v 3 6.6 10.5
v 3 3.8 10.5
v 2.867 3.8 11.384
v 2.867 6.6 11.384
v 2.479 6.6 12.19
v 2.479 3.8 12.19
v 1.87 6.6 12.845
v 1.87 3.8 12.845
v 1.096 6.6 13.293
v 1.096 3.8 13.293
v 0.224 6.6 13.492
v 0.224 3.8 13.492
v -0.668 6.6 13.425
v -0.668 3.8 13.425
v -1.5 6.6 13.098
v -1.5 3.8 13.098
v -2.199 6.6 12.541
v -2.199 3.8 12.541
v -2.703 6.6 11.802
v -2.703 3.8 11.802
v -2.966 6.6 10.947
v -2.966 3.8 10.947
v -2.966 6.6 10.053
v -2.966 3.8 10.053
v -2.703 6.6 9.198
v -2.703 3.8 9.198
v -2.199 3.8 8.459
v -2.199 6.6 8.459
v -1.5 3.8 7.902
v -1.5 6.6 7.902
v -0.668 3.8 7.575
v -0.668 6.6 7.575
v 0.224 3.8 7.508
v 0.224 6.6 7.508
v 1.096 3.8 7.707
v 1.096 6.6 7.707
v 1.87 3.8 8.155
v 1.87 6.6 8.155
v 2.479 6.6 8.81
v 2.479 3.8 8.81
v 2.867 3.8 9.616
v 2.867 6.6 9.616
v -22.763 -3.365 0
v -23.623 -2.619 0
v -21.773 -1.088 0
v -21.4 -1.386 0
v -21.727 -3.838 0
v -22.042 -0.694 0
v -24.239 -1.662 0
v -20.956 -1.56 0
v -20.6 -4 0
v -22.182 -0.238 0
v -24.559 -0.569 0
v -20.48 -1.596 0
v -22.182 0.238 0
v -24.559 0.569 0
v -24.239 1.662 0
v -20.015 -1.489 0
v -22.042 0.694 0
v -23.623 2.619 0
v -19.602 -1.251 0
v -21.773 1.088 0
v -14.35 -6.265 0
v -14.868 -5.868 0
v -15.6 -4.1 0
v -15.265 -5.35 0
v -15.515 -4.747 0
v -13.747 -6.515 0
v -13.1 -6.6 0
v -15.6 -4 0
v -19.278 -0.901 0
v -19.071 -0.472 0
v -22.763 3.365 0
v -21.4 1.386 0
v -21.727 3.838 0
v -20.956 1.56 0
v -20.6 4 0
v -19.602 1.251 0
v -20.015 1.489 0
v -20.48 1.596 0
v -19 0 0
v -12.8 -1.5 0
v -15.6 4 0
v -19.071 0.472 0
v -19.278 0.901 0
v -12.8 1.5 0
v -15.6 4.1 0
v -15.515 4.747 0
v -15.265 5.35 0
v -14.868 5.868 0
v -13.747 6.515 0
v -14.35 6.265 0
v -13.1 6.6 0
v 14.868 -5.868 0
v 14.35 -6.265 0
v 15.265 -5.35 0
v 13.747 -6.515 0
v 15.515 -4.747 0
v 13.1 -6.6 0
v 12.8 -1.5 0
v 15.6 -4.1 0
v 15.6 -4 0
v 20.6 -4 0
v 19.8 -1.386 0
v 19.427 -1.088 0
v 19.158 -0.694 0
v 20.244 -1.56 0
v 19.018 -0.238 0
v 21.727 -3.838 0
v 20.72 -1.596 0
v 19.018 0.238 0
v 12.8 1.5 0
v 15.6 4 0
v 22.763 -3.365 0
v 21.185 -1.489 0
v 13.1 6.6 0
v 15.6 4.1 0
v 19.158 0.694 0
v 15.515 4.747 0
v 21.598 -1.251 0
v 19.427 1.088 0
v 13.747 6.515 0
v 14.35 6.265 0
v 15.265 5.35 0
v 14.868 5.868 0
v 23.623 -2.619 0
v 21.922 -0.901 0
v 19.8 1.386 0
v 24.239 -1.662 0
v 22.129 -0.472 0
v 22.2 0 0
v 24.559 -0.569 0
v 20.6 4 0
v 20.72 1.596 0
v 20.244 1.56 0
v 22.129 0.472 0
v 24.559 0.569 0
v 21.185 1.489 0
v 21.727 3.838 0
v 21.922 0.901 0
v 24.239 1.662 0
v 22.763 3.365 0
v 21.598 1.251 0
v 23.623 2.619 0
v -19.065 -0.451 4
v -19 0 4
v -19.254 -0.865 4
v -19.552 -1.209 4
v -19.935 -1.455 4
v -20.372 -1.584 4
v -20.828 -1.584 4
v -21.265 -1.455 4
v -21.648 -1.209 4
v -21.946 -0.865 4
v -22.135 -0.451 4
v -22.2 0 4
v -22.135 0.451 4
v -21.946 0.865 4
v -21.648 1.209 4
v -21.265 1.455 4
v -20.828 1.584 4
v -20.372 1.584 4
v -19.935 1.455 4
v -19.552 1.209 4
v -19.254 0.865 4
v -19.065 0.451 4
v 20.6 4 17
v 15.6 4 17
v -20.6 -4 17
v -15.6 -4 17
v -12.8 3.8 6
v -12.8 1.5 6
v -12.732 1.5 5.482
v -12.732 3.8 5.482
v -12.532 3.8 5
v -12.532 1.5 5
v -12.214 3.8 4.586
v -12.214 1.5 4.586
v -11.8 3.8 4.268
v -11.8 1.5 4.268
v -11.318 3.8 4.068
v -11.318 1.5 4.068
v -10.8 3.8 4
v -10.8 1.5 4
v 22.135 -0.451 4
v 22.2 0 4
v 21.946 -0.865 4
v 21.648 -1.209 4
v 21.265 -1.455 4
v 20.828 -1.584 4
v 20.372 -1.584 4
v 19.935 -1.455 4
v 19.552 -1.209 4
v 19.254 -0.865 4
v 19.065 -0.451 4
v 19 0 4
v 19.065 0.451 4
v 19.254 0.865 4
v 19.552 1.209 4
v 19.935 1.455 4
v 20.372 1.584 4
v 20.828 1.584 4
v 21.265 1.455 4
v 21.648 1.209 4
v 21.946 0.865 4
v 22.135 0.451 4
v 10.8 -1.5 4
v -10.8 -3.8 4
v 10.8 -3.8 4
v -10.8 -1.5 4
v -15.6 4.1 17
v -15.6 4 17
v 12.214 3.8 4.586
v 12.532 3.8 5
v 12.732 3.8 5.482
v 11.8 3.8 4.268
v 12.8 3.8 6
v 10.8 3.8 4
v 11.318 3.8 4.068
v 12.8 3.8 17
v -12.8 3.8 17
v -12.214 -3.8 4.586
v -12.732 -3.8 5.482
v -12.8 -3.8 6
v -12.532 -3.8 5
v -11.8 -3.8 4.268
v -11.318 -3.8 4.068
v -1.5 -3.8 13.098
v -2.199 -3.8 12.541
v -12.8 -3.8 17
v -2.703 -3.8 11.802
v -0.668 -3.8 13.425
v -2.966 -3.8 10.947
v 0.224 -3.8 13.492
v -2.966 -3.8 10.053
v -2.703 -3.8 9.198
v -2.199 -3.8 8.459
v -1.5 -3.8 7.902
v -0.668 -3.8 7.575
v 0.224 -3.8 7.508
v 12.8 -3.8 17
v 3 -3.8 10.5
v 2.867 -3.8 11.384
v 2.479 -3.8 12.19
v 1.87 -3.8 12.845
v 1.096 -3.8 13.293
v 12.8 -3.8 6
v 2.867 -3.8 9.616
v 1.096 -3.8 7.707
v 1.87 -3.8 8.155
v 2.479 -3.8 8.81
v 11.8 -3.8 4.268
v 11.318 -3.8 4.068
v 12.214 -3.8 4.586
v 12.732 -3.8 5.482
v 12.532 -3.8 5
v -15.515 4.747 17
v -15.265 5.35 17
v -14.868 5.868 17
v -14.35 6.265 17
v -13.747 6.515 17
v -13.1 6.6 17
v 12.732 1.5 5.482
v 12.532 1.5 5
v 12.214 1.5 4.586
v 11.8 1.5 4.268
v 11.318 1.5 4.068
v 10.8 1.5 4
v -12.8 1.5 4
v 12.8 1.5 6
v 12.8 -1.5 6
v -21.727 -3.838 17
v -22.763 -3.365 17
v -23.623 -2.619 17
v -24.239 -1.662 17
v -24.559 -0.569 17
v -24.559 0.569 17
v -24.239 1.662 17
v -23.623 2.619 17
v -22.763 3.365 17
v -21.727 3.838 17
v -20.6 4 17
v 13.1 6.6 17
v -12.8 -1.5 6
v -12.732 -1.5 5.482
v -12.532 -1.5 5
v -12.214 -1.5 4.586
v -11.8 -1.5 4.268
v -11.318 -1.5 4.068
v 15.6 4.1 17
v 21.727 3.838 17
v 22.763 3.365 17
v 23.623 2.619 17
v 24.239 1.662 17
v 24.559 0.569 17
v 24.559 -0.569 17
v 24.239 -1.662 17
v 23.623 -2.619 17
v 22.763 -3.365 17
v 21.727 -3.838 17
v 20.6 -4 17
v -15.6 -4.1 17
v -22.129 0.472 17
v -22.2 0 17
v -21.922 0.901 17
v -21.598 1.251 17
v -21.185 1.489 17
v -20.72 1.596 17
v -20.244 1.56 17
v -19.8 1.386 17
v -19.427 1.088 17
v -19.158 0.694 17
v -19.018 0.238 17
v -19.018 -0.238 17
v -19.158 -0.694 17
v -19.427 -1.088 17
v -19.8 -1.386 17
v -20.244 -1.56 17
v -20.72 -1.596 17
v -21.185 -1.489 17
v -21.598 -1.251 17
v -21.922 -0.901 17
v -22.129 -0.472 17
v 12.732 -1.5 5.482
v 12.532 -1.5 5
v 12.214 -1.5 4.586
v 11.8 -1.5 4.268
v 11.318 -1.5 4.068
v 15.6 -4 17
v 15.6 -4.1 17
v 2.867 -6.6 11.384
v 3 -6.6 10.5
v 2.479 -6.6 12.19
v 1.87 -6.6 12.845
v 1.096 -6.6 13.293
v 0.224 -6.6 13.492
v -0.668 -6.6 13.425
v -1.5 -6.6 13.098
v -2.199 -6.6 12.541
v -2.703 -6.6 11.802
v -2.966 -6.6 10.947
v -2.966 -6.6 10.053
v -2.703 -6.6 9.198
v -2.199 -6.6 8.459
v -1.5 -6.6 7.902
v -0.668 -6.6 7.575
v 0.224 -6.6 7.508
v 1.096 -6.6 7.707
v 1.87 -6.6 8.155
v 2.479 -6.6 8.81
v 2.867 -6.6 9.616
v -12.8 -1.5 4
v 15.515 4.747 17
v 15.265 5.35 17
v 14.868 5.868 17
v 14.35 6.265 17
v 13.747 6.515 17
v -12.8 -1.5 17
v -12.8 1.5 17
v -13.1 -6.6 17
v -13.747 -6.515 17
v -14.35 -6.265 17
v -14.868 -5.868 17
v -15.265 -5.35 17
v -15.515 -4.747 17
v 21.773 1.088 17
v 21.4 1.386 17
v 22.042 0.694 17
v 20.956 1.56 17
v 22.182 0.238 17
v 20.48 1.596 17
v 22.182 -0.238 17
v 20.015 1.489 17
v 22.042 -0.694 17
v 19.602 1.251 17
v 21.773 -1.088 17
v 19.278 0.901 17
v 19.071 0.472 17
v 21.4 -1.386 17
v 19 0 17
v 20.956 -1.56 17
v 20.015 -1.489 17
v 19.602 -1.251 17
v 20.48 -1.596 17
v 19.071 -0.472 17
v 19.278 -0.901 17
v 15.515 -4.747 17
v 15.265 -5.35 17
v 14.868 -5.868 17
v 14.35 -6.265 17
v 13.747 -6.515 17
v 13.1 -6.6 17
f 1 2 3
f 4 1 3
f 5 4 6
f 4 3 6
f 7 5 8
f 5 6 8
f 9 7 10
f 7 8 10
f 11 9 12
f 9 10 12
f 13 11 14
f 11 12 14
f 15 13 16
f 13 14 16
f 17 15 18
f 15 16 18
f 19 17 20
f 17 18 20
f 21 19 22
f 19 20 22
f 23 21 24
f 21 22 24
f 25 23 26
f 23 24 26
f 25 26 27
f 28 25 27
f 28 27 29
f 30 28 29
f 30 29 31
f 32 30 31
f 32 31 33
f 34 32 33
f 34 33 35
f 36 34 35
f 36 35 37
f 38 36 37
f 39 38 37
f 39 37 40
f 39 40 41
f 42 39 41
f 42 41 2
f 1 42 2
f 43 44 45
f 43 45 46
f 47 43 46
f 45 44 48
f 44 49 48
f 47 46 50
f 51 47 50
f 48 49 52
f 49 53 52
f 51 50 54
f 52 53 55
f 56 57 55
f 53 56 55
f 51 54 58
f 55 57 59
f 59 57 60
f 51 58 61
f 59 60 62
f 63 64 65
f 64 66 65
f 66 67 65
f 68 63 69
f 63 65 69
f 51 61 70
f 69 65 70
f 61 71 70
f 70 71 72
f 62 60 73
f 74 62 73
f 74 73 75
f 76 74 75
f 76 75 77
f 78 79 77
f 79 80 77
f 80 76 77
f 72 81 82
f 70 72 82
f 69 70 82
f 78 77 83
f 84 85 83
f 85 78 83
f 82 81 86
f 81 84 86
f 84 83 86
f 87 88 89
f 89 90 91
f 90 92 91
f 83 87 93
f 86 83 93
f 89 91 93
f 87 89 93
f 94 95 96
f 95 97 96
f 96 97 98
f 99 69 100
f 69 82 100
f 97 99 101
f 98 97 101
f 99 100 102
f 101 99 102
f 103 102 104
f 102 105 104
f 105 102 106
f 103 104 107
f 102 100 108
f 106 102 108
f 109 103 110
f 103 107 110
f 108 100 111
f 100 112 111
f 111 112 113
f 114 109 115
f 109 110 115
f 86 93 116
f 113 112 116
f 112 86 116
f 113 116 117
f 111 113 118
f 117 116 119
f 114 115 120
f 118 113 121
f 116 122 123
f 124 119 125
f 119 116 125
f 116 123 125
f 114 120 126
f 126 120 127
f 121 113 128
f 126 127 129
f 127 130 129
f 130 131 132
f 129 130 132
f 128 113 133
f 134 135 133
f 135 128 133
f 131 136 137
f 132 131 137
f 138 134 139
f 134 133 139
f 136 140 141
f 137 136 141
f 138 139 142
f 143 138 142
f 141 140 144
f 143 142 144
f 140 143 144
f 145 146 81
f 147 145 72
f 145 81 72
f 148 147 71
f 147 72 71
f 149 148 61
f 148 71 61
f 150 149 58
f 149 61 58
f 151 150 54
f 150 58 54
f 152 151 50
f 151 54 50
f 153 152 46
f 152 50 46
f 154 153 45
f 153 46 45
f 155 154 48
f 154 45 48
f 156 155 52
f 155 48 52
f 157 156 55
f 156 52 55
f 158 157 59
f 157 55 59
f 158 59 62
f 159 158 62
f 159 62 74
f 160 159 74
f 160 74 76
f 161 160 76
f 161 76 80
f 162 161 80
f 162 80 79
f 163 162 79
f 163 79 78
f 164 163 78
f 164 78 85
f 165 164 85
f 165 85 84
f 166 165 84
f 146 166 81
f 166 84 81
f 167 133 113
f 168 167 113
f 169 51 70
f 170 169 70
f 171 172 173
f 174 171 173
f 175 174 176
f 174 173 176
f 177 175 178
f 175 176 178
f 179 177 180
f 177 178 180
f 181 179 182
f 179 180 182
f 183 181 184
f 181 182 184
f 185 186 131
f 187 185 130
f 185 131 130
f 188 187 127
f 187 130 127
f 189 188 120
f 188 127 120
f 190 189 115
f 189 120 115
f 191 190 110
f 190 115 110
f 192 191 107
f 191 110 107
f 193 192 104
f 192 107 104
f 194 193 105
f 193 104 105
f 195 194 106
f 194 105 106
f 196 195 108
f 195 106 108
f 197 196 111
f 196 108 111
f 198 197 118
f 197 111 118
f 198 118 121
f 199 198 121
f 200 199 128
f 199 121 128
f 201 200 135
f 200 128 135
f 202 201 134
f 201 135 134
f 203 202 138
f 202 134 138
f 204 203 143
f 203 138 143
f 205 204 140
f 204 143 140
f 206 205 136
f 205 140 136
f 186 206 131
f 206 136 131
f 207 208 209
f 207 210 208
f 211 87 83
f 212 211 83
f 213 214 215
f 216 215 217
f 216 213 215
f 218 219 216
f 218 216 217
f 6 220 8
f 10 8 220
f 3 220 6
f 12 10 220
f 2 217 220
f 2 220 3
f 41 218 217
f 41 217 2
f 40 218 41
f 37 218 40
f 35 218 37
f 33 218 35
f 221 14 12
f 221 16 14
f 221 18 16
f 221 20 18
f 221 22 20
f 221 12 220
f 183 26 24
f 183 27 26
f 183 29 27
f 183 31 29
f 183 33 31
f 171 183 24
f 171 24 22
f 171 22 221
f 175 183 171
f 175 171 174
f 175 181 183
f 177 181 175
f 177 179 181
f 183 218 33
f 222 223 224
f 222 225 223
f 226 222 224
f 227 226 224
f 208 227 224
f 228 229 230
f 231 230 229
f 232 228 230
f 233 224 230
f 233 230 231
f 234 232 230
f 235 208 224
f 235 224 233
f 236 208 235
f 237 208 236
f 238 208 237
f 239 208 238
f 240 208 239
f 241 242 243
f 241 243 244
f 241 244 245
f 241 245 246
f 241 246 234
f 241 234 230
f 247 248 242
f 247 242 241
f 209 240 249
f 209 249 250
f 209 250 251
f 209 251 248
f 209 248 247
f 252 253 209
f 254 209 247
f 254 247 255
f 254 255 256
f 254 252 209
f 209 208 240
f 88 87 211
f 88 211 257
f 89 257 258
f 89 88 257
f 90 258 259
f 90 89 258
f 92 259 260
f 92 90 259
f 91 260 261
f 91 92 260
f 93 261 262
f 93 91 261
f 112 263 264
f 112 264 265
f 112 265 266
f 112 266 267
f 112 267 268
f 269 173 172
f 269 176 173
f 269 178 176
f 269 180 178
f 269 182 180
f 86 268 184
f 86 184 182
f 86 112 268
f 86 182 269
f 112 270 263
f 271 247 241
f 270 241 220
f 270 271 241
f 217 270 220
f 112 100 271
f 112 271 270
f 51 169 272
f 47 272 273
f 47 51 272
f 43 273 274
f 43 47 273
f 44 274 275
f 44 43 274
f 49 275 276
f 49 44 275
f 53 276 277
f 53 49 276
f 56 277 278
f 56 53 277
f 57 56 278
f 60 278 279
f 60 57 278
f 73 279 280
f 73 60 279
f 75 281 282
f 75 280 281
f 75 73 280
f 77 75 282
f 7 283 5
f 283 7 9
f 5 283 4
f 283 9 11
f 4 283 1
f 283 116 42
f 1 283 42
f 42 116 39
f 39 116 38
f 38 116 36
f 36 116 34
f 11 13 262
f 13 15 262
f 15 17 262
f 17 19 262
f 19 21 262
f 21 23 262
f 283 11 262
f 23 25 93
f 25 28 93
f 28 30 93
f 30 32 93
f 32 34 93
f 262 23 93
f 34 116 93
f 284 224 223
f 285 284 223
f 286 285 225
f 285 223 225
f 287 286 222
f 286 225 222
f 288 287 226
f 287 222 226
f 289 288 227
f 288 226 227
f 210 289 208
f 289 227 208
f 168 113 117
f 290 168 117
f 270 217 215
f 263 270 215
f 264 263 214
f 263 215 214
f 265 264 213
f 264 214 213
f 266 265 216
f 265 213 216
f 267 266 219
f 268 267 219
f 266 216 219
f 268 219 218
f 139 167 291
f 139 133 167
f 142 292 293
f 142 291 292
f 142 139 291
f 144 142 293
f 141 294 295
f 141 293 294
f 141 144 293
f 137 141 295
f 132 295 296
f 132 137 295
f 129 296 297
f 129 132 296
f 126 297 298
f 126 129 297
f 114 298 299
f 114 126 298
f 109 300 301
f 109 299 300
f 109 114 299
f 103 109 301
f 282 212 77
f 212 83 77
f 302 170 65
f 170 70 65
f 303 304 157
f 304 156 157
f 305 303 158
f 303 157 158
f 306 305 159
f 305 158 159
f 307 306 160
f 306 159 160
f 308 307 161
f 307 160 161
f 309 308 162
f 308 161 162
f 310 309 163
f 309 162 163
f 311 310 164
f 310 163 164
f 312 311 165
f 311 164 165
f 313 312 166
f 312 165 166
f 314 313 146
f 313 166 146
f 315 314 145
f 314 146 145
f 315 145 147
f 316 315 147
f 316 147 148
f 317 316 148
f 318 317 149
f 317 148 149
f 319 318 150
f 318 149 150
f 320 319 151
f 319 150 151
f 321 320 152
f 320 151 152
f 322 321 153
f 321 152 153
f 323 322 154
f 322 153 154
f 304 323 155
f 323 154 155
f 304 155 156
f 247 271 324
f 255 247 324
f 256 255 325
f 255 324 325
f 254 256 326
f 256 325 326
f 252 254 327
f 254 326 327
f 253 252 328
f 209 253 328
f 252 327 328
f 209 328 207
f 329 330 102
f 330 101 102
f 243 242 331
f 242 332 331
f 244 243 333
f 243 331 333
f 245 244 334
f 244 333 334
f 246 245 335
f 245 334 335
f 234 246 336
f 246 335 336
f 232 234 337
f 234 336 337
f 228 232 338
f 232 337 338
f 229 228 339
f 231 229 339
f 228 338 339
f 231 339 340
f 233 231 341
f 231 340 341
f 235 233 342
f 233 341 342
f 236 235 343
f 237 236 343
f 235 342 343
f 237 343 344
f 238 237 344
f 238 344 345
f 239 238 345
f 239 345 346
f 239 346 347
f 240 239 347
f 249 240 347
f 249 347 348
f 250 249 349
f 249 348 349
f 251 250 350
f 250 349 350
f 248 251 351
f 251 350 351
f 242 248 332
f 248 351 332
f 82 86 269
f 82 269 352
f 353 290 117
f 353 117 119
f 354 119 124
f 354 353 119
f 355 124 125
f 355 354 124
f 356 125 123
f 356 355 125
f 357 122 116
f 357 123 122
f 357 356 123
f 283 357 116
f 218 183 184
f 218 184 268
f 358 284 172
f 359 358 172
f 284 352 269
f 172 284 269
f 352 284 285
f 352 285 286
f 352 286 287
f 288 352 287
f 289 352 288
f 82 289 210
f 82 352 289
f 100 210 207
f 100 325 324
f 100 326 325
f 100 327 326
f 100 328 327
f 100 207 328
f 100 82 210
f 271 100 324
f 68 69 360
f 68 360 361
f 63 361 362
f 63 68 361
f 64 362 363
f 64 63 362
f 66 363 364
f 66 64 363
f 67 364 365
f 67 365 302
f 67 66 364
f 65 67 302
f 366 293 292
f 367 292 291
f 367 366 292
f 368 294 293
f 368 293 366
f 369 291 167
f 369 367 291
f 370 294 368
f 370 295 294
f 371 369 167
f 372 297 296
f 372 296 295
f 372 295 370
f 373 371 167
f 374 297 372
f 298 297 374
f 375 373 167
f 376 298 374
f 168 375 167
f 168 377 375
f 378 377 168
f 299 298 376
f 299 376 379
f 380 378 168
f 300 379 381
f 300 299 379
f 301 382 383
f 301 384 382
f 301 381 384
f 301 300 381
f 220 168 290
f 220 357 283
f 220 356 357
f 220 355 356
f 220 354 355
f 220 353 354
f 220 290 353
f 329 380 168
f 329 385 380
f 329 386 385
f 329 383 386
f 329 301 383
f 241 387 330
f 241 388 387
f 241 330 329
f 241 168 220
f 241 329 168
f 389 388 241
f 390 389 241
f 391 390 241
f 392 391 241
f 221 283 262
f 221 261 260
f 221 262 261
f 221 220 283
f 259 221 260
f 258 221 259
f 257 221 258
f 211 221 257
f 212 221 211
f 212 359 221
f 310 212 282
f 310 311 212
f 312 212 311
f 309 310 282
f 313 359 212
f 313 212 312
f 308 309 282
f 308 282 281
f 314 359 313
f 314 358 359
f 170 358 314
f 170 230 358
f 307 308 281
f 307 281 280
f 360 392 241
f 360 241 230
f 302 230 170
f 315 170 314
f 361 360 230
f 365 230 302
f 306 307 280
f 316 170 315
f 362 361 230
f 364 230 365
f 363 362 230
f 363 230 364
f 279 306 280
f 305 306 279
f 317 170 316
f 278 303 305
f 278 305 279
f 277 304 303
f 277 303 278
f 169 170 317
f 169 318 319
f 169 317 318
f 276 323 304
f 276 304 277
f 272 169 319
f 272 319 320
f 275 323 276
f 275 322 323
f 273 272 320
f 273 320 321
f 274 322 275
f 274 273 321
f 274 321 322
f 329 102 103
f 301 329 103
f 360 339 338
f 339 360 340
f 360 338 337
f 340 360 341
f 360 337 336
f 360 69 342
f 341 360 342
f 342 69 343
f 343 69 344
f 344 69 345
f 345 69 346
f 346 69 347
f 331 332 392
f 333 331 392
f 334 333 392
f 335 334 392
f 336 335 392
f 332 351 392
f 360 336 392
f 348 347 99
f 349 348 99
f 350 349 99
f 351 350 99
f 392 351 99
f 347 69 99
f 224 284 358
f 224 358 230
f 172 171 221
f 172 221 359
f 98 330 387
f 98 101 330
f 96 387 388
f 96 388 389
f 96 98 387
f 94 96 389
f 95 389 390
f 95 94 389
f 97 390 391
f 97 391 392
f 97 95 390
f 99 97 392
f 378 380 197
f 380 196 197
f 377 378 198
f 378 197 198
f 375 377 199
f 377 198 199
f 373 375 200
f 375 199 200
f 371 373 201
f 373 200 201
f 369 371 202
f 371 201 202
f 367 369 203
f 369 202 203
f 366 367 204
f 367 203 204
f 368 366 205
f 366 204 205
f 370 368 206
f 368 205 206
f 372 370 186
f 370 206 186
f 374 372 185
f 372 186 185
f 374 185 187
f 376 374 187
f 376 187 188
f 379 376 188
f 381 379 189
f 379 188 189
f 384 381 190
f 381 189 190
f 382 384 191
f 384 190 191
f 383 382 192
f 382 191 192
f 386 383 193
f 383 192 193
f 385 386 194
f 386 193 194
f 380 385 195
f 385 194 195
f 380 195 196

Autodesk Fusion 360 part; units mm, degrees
sketch "Skizze1" plane through (0, 0, 0) normal (0, 0, 1) x (1, 0, 0)
  line L0 (12.8, 3.8) -> (-12.8, 3.8)
  line L1 (-12.8, 3.8) -> (-12.8, -3.8)
  line L2 (-12.8, -3.8) -> (12.8, -3.8)
  line L3 (12.8, -3.8) -> (12.8, 3.8)
  line L4 (12.8, 3.8) -> (-12.8, -3.8) construction
  line L5 (-12.8, 3.8) -> (12.8, -3.8) construction
  line L6 (-15.6, 6.6) -> (-15.6, -6.6)
  line L7 (-15.6, -6.6) -> (15.6, -6.6)
  line L8 (15.6, -6.6) -> (15.6, 6.6)
  line L9 (15.6, 6.6) -> (-15.6, 6.6)
  line L10 (12.8, 1.5) -> (-12.8, 1.5)
  line L11 (-12.8, 1.5) -> (-12.8, -1.5)
  line L12 (-12.8, -1.5) -> (12.8, -1.5)
  line L13 (12.8, -1.5) -> (12.8, 1.5)
  line L14 (12.8, 1.5) -> (-12.8, -1.5) construction
  line L15 (-12.8, 1.5) -> (12.8, -1.5) construction
  circle A0 centre (20.6, 0) radius 1.6
  circle A1 centre (-20.6, 0) radius 1.6
  circle A2 centre (20.6, 0) radius 4
  circle A3 centre (-20.6, 0) radius 4
  line L16 (-20.6, 4) -> (-15.6, 4)
  line L17 (-20.6, -4) -> (-15.6, -4)
  line L18 (20.6, 4) -> (15.6, 4)
  line L19 (20.6, -4) -> (15.6, -4)
  dimension "d1" = 25.6
  dimension "d2" = 7.6
  dimension "d3" = 2.8
  dimension "d4" = 3
  dimension "d5" = 3.2
  dimension "d6" = 5
  dimension "d7" = 3.2
  dimension "d8" = 5
  dimension "d9" = 8
  dimension "d10" = 8
extrude "Extrusion1" add sketch "Skizze1" along normal blind 4 contours L0 L1 L3 L10 | L1 L2 L3 L12 | L6 L7 L8 L9 | L6 A3 L16 L17 | A3 | L8 A2 L18 L19 | A2
sketch "Skizze2" plane through (0, 0, 4) normal (0, 0, 1) x (-1, 0, 0)
  circle A0 centre (-20.6, 0) radius 1.6
  line L0 (-12.8, -1.5) -> (-12.8, 1.5)
  line L1 (-12.8, 1.5) -> (12.8, 1.5)
  line L2 (12.8, 1.5) -> (12.8, -1.5)
  line L3 (12.8, -1.5) -> (-12.8, -1.5)
  circle A1 centre (20.6, 0) radius 1.6
  line L4 (-20.6, -4) -> (-15.6, -4)
  line L5 (-15.6, -4) -> (-15.6, -6.6)
  line L6 (-15.6, -6.6) -> (15.6, -6.6)
  line L7 (15.6, -6.6) -> (15.6, -4)
  line L8 (15.6, -4) -> (20.6, -4)
  arc A2 (20.6, -4) -> (20.6, 4) centre (20.6, 0) ccw
  line L9 (20.6, 4) -> (15.6, 4)
  line L10 (15.6, 4) -> (15.6, 6.6)
  line L11 (15.6, 6.6) -> (-15.6, 6.6)
  line L12 (-15.6, 6.6) -> (-15.6, 4)
  line L13 (-15.6, 4) -> (-20.6, 4)
  arc A3 (-20.6, 4) -> (-20.6, -4) centre (-20.6, 0) ccw
  line L14 (-12.8, -3.8) -> (12.8, -3.8)
  line L15 (12.8, -3.8) -> (12.8, 3.8)
  line L16 (12.8, 3.8) -> (-12.8, 3.8)
  line L17 (-12.8, 3.8) -> (-12.8, -3.8)
extrude "Extrusion2" add sketch "Skizze2" along normal blind 13
fillet "Abrundung1" radius 2 4 edges at (12.8, 2.65, 4) (12.8, -2.65, 4) (-12.8, -2.65, 4) (-12.8, 2.65, 4)
fillet "Abrundung2" radius 2.5 4 edges at (-15.6, -6.6, 8.5) (15.6, -6.6, 8.5) (15.6, 6.6, 8.5) (-15.6, 6.6, 8.5)
sketch "Skizze3" plane through (0, -6.6, 0) normal (0, -1, 0) x (1, 0, 0)
  line L0 (13.1, 0) -> (13.1, 17)
  line L1 (13.1, 17) -> (-13.1, 17)
  line L2 (-13.1, 17) -> (-13.1, 0)
  line L3 (-13.1, 0) -> (13.1, 0)
  circle A0 centre (0, 10.5) radius 3
  line L4 (5.8778, 17) -> (5.8778, 4) construction
  point P0 (5.8778, 10.5)
  dimension "d19" = 6
extrude "Extrusion3" cut sketch "Skizze3" against normal up to surface (13.2 mm away) contours A0
